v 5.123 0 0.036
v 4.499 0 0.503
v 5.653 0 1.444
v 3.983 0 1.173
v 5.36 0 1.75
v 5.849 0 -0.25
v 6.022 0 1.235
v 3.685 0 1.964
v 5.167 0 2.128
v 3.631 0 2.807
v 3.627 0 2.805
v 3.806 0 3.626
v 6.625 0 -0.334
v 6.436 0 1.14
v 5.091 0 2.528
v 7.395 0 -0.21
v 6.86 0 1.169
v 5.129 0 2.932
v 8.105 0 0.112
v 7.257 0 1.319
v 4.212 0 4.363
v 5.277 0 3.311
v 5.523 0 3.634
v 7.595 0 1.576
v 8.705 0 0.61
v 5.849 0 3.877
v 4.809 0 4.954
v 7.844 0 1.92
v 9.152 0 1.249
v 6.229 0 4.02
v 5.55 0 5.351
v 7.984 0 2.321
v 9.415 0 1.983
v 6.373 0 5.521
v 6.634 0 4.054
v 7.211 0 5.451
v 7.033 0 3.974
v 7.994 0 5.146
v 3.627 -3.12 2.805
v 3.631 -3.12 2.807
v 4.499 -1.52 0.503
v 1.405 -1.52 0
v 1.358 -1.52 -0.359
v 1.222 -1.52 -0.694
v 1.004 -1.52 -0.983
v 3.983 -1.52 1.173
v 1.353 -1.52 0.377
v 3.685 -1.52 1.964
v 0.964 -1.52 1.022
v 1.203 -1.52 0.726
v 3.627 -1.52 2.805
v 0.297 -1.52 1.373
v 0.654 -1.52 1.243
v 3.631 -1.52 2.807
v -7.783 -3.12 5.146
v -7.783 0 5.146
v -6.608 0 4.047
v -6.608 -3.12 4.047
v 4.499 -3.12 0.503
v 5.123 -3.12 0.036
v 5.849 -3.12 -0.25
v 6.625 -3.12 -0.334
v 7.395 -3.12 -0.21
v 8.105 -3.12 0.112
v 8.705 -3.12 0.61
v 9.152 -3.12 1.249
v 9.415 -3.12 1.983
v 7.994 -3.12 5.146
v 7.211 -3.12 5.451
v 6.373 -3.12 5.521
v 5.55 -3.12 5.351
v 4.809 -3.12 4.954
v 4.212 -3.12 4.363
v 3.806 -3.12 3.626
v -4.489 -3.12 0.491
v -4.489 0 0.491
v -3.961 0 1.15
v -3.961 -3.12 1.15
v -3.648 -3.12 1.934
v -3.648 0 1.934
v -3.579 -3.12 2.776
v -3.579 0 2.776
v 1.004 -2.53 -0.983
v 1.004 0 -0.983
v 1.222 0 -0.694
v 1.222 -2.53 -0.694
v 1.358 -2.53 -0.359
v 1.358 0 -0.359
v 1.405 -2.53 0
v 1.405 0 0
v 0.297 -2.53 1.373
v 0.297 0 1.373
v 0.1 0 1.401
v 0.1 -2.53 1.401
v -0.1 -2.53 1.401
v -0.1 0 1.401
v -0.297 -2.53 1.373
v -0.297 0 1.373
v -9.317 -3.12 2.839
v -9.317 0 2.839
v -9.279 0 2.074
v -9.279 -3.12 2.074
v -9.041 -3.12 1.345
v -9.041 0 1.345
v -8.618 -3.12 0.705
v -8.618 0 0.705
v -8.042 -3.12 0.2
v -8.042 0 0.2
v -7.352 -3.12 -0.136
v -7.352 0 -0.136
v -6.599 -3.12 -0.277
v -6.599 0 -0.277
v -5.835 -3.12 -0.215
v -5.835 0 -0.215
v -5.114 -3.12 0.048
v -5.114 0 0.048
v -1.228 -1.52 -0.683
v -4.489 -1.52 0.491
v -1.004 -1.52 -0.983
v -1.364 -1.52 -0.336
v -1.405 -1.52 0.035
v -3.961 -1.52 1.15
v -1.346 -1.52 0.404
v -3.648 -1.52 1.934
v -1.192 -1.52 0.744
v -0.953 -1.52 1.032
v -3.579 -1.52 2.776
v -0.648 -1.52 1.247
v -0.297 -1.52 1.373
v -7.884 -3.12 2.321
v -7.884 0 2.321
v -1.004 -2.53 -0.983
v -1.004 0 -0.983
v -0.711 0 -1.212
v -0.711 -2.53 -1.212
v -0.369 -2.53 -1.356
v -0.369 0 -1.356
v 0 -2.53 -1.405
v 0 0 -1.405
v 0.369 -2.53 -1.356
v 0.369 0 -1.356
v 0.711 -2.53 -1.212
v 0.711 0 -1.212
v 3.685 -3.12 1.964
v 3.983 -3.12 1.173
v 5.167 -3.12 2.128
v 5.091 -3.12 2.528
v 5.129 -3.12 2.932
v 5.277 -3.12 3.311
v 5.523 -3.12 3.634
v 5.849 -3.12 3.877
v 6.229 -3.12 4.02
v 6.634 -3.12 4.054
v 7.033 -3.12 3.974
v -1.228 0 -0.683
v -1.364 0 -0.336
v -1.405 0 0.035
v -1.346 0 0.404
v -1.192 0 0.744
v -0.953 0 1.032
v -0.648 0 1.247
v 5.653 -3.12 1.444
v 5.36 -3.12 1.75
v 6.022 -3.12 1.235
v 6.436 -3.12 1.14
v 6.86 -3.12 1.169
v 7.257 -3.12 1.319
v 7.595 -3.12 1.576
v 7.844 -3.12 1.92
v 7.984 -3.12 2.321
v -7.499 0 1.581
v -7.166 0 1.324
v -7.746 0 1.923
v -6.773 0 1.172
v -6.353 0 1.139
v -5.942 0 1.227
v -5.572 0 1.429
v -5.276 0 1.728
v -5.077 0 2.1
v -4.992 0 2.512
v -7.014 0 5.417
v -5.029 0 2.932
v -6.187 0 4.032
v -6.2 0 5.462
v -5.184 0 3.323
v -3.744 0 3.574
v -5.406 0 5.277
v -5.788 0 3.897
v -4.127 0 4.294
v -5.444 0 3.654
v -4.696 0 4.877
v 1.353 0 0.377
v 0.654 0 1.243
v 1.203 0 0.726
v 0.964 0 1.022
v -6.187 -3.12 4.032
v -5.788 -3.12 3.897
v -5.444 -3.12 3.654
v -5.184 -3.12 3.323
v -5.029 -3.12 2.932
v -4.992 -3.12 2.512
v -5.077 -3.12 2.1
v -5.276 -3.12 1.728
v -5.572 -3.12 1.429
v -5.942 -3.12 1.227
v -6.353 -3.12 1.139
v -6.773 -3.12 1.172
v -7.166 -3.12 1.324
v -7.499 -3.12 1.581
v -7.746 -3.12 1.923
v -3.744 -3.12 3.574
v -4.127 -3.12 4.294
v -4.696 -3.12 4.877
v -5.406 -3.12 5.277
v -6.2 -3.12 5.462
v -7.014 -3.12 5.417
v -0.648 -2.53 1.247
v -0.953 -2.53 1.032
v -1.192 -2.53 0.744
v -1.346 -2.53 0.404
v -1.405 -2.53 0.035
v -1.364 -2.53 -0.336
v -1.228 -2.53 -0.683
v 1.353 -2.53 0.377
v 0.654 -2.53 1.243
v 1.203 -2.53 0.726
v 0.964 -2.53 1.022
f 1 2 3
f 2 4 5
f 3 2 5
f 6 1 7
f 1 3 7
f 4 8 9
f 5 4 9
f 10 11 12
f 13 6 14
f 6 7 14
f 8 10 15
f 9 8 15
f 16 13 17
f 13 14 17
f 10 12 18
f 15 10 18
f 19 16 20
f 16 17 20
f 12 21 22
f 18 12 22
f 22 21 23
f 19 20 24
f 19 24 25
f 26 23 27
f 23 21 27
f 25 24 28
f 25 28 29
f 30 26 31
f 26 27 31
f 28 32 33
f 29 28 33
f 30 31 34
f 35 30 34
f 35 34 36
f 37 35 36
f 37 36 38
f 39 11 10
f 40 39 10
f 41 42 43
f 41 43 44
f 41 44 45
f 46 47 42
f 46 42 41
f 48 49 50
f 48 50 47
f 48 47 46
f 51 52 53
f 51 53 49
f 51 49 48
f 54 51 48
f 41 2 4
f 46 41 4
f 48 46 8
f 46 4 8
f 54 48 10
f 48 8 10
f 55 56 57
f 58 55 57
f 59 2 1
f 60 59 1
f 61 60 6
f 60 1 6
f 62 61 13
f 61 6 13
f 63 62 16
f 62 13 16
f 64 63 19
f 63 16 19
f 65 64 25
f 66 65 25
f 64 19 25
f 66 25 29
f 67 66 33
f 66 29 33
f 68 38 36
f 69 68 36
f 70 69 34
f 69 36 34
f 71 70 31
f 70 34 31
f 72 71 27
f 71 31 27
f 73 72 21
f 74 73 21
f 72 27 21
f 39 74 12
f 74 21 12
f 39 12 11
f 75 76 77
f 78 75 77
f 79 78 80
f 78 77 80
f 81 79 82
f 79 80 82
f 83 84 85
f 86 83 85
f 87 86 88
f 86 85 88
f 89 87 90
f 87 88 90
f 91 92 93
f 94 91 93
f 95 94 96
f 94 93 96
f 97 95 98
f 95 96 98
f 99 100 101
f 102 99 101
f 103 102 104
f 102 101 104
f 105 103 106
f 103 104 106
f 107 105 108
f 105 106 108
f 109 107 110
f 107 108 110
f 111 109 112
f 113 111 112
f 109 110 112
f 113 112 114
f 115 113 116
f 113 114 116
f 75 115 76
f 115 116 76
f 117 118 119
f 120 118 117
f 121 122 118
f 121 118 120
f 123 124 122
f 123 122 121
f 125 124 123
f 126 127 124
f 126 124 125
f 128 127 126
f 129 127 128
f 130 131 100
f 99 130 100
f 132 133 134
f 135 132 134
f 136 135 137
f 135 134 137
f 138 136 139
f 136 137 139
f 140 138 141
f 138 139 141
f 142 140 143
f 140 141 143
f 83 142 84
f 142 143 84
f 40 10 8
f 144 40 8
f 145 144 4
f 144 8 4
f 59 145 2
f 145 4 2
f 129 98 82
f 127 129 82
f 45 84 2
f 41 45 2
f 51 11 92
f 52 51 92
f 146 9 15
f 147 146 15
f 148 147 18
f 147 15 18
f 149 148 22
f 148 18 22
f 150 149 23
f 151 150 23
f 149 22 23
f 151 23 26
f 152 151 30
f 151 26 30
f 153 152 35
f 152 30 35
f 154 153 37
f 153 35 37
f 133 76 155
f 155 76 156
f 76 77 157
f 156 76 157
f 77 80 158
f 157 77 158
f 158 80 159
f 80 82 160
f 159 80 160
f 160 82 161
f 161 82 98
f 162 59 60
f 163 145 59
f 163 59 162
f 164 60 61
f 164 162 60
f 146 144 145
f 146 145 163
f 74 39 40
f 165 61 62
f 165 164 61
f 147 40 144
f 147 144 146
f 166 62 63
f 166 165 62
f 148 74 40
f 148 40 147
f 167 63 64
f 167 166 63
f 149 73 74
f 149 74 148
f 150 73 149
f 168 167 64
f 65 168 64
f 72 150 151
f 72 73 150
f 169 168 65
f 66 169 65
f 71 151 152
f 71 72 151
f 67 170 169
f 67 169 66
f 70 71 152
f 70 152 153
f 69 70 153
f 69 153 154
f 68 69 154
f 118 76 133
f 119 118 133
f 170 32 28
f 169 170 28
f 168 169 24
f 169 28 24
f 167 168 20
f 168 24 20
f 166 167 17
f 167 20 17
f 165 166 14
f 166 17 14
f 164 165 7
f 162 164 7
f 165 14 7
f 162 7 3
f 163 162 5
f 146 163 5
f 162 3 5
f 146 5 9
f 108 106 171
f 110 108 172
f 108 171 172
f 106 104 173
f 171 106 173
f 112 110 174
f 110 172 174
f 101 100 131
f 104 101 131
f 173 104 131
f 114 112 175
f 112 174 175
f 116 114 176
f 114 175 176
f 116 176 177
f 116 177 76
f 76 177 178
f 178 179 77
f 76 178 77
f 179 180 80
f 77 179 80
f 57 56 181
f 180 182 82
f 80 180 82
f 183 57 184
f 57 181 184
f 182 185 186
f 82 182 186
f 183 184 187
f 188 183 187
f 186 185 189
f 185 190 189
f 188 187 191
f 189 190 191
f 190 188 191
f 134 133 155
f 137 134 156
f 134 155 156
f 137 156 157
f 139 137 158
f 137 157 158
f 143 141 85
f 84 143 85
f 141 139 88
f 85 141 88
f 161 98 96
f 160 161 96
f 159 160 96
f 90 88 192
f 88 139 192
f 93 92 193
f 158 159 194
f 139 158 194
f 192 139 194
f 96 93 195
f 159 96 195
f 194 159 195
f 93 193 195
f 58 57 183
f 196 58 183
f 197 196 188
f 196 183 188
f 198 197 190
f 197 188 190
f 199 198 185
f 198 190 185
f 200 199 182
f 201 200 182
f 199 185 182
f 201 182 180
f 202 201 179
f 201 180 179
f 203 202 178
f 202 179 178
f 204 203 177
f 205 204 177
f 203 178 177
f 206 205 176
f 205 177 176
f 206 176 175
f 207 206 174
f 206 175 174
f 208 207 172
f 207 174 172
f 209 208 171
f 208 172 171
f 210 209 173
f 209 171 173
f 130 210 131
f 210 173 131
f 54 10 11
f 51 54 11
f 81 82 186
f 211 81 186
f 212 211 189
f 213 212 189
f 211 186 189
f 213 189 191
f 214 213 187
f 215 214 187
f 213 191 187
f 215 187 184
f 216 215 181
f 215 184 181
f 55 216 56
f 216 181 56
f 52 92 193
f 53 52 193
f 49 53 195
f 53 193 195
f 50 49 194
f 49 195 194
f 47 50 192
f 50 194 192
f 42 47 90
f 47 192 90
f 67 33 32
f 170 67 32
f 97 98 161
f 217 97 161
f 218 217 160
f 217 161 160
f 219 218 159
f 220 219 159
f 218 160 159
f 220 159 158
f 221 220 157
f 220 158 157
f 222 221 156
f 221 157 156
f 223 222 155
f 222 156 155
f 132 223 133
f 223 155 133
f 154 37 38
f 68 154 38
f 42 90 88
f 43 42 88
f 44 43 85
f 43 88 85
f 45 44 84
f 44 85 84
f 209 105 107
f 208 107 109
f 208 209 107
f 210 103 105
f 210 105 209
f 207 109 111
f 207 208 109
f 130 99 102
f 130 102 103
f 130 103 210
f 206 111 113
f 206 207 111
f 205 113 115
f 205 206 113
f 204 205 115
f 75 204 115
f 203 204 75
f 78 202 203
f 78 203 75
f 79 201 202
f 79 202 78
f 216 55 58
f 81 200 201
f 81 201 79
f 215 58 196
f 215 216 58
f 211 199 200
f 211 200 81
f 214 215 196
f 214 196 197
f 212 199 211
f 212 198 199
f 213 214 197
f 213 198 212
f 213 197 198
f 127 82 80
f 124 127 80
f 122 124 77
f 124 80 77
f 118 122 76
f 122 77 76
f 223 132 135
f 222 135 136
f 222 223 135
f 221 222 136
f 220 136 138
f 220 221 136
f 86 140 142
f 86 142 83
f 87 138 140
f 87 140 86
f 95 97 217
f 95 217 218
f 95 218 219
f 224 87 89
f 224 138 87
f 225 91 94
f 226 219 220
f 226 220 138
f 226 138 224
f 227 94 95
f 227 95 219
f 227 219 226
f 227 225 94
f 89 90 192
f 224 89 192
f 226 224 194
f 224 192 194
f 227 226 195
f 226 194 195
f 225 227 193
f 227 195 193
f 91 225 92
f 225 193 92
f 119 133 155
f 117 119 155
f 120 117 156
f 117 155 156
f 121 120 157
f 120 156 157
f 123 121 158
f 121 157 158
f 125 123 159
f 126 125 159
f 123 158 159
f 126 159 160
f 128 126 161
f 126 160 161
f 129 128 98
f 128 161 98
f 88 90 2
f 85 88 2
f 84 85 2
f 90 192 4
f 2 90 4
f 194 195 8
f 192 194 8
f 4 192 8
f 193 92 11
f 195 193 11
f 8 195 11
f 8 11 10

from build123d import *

# Parameters (mm, degrees)
F1_DEPTH = 3.12
F2_DEPTH = 2.53
F3_DEPTH = 1.52


with BuildPart() as f1:
    # F0 (on Front) → F1 (new body)
    with BuildSketch(Plane.XZ):
        with BuildLine():
            ThreePointArc((7.994299, 5.145756), (5.165446, 5.179012), (3.626637, 2.805075))
            Line((3.626637, 2.805075), (3.631367, 2.807108))
            ThreePointArc((3.631367, 2.807108), (3.804802, 1.556995), (4.498737, 0.502804))
            ThreePointArc((4.498737, 0.502804), (7.394721, -0.210037), (9.415493, 1.983441))
            Line((9.415493, 1.983441), (7.9835, 2.320658))
            ThreePointArc((7.9835, 2.320658), (6.649166, 1.139412), (5.166645, 2.128311))
            ThreePointArc((5.166645, 2.128311), (5.523041, 3.634079), (7.032653, 3.97383))
            Line((7.032653, 3.97383), (7.994299, 5.145756))
        make_face()
        with BuildLine():
            ThreePointArc((-4.488759, 0.490969), (-3.775142, 1.530496), (-3.578517, 2.775969))
            ThreePointArc((-3.578517, 2.775969), (-5.037216, 5.102351), (-7.782753, 5.145756))
            Line((-7.782753, 5.145756), (-6.608078, 4.047432))
            ThreePointArc((-6.608078, 4.047432), (-5.275645, 1.728491), (-7.883748, 2.320658))
            Line((-7.883748, 2.320658), (-9.316716, 2.839275))
            ThreePointArc((-9.316716, 2.839275), (-7.708383, 0.00877), (-4.488759, 0.490969))
        make_face()
    extrude(amount=F1_DEPTH)


with BuildPart() as f2:
    # F0 (on Front) → F2 (new body)
    with BuildSketch(Plane.XZ):
        with BuildLine():
            ThreePointArc((1.0042, -0.982654), (1.300947, -0.530624), (1.405, 0))
            ThreePointArc((1.405, 0), (1.093303, 0.882447), (0.296512, 1.373356))
            ThreePointArc((0.296512, 1.373356), (0, 1.405), (-0.296512, 1.373356))
            ThreePointArc((-0.296512, 1.373356), (-1.345607, 0.404187), (-1.0042, -0.982654))
            ThreePointArc((-1.0042, -0.982654), (0, -1.405), (1.0042, -0.982654))
        make_face()
    extrude(amount=F2_DEPTH)


with BuildPart() as f3:
    # F0 (on Front) → F3 (new body)
    with BuildSketch(Plane.XZ):
        with BuildLine():
            ThreePointArc((-1.0042, -0.982654), (-1.345607, 0.404187), (-0.296512, 1.373356))
            Line((-0.296512, 1.373356), (-3.578517, 2.775969))
            ThreePointArc((-3.578517, 2.775969), (-3.775142, 1.530496), (-4.488759, 0.490969))
            Line((-4.488759, 0.490969), (-1.0042, -0.982654))
        make_face()
        with BuildLine():
            ThreePointArc((0.296512, 1.373356), (1.093303, 0.882447), (1.405, 0))
            ThreePointArc((1.405, 0), (1.300947, -0.530624), (1.0042, -0.982654))
            Line((1.0042, -0.982654), (4.498737, 0.502804))
            ThreePointArc((4.498737, 0.502804), (3.804802, 1.556995), (3.631367, 2.807108))
            Line((3.631367, 2.807108), (3.626637, 2.805075))
            Line((3.626637, 2.805075), (0.296512, 1.373356))
        make_face()
    extrude(amount=F3_DEPTH)


solid = Compound([f1.part, f2.part, f3.part])
